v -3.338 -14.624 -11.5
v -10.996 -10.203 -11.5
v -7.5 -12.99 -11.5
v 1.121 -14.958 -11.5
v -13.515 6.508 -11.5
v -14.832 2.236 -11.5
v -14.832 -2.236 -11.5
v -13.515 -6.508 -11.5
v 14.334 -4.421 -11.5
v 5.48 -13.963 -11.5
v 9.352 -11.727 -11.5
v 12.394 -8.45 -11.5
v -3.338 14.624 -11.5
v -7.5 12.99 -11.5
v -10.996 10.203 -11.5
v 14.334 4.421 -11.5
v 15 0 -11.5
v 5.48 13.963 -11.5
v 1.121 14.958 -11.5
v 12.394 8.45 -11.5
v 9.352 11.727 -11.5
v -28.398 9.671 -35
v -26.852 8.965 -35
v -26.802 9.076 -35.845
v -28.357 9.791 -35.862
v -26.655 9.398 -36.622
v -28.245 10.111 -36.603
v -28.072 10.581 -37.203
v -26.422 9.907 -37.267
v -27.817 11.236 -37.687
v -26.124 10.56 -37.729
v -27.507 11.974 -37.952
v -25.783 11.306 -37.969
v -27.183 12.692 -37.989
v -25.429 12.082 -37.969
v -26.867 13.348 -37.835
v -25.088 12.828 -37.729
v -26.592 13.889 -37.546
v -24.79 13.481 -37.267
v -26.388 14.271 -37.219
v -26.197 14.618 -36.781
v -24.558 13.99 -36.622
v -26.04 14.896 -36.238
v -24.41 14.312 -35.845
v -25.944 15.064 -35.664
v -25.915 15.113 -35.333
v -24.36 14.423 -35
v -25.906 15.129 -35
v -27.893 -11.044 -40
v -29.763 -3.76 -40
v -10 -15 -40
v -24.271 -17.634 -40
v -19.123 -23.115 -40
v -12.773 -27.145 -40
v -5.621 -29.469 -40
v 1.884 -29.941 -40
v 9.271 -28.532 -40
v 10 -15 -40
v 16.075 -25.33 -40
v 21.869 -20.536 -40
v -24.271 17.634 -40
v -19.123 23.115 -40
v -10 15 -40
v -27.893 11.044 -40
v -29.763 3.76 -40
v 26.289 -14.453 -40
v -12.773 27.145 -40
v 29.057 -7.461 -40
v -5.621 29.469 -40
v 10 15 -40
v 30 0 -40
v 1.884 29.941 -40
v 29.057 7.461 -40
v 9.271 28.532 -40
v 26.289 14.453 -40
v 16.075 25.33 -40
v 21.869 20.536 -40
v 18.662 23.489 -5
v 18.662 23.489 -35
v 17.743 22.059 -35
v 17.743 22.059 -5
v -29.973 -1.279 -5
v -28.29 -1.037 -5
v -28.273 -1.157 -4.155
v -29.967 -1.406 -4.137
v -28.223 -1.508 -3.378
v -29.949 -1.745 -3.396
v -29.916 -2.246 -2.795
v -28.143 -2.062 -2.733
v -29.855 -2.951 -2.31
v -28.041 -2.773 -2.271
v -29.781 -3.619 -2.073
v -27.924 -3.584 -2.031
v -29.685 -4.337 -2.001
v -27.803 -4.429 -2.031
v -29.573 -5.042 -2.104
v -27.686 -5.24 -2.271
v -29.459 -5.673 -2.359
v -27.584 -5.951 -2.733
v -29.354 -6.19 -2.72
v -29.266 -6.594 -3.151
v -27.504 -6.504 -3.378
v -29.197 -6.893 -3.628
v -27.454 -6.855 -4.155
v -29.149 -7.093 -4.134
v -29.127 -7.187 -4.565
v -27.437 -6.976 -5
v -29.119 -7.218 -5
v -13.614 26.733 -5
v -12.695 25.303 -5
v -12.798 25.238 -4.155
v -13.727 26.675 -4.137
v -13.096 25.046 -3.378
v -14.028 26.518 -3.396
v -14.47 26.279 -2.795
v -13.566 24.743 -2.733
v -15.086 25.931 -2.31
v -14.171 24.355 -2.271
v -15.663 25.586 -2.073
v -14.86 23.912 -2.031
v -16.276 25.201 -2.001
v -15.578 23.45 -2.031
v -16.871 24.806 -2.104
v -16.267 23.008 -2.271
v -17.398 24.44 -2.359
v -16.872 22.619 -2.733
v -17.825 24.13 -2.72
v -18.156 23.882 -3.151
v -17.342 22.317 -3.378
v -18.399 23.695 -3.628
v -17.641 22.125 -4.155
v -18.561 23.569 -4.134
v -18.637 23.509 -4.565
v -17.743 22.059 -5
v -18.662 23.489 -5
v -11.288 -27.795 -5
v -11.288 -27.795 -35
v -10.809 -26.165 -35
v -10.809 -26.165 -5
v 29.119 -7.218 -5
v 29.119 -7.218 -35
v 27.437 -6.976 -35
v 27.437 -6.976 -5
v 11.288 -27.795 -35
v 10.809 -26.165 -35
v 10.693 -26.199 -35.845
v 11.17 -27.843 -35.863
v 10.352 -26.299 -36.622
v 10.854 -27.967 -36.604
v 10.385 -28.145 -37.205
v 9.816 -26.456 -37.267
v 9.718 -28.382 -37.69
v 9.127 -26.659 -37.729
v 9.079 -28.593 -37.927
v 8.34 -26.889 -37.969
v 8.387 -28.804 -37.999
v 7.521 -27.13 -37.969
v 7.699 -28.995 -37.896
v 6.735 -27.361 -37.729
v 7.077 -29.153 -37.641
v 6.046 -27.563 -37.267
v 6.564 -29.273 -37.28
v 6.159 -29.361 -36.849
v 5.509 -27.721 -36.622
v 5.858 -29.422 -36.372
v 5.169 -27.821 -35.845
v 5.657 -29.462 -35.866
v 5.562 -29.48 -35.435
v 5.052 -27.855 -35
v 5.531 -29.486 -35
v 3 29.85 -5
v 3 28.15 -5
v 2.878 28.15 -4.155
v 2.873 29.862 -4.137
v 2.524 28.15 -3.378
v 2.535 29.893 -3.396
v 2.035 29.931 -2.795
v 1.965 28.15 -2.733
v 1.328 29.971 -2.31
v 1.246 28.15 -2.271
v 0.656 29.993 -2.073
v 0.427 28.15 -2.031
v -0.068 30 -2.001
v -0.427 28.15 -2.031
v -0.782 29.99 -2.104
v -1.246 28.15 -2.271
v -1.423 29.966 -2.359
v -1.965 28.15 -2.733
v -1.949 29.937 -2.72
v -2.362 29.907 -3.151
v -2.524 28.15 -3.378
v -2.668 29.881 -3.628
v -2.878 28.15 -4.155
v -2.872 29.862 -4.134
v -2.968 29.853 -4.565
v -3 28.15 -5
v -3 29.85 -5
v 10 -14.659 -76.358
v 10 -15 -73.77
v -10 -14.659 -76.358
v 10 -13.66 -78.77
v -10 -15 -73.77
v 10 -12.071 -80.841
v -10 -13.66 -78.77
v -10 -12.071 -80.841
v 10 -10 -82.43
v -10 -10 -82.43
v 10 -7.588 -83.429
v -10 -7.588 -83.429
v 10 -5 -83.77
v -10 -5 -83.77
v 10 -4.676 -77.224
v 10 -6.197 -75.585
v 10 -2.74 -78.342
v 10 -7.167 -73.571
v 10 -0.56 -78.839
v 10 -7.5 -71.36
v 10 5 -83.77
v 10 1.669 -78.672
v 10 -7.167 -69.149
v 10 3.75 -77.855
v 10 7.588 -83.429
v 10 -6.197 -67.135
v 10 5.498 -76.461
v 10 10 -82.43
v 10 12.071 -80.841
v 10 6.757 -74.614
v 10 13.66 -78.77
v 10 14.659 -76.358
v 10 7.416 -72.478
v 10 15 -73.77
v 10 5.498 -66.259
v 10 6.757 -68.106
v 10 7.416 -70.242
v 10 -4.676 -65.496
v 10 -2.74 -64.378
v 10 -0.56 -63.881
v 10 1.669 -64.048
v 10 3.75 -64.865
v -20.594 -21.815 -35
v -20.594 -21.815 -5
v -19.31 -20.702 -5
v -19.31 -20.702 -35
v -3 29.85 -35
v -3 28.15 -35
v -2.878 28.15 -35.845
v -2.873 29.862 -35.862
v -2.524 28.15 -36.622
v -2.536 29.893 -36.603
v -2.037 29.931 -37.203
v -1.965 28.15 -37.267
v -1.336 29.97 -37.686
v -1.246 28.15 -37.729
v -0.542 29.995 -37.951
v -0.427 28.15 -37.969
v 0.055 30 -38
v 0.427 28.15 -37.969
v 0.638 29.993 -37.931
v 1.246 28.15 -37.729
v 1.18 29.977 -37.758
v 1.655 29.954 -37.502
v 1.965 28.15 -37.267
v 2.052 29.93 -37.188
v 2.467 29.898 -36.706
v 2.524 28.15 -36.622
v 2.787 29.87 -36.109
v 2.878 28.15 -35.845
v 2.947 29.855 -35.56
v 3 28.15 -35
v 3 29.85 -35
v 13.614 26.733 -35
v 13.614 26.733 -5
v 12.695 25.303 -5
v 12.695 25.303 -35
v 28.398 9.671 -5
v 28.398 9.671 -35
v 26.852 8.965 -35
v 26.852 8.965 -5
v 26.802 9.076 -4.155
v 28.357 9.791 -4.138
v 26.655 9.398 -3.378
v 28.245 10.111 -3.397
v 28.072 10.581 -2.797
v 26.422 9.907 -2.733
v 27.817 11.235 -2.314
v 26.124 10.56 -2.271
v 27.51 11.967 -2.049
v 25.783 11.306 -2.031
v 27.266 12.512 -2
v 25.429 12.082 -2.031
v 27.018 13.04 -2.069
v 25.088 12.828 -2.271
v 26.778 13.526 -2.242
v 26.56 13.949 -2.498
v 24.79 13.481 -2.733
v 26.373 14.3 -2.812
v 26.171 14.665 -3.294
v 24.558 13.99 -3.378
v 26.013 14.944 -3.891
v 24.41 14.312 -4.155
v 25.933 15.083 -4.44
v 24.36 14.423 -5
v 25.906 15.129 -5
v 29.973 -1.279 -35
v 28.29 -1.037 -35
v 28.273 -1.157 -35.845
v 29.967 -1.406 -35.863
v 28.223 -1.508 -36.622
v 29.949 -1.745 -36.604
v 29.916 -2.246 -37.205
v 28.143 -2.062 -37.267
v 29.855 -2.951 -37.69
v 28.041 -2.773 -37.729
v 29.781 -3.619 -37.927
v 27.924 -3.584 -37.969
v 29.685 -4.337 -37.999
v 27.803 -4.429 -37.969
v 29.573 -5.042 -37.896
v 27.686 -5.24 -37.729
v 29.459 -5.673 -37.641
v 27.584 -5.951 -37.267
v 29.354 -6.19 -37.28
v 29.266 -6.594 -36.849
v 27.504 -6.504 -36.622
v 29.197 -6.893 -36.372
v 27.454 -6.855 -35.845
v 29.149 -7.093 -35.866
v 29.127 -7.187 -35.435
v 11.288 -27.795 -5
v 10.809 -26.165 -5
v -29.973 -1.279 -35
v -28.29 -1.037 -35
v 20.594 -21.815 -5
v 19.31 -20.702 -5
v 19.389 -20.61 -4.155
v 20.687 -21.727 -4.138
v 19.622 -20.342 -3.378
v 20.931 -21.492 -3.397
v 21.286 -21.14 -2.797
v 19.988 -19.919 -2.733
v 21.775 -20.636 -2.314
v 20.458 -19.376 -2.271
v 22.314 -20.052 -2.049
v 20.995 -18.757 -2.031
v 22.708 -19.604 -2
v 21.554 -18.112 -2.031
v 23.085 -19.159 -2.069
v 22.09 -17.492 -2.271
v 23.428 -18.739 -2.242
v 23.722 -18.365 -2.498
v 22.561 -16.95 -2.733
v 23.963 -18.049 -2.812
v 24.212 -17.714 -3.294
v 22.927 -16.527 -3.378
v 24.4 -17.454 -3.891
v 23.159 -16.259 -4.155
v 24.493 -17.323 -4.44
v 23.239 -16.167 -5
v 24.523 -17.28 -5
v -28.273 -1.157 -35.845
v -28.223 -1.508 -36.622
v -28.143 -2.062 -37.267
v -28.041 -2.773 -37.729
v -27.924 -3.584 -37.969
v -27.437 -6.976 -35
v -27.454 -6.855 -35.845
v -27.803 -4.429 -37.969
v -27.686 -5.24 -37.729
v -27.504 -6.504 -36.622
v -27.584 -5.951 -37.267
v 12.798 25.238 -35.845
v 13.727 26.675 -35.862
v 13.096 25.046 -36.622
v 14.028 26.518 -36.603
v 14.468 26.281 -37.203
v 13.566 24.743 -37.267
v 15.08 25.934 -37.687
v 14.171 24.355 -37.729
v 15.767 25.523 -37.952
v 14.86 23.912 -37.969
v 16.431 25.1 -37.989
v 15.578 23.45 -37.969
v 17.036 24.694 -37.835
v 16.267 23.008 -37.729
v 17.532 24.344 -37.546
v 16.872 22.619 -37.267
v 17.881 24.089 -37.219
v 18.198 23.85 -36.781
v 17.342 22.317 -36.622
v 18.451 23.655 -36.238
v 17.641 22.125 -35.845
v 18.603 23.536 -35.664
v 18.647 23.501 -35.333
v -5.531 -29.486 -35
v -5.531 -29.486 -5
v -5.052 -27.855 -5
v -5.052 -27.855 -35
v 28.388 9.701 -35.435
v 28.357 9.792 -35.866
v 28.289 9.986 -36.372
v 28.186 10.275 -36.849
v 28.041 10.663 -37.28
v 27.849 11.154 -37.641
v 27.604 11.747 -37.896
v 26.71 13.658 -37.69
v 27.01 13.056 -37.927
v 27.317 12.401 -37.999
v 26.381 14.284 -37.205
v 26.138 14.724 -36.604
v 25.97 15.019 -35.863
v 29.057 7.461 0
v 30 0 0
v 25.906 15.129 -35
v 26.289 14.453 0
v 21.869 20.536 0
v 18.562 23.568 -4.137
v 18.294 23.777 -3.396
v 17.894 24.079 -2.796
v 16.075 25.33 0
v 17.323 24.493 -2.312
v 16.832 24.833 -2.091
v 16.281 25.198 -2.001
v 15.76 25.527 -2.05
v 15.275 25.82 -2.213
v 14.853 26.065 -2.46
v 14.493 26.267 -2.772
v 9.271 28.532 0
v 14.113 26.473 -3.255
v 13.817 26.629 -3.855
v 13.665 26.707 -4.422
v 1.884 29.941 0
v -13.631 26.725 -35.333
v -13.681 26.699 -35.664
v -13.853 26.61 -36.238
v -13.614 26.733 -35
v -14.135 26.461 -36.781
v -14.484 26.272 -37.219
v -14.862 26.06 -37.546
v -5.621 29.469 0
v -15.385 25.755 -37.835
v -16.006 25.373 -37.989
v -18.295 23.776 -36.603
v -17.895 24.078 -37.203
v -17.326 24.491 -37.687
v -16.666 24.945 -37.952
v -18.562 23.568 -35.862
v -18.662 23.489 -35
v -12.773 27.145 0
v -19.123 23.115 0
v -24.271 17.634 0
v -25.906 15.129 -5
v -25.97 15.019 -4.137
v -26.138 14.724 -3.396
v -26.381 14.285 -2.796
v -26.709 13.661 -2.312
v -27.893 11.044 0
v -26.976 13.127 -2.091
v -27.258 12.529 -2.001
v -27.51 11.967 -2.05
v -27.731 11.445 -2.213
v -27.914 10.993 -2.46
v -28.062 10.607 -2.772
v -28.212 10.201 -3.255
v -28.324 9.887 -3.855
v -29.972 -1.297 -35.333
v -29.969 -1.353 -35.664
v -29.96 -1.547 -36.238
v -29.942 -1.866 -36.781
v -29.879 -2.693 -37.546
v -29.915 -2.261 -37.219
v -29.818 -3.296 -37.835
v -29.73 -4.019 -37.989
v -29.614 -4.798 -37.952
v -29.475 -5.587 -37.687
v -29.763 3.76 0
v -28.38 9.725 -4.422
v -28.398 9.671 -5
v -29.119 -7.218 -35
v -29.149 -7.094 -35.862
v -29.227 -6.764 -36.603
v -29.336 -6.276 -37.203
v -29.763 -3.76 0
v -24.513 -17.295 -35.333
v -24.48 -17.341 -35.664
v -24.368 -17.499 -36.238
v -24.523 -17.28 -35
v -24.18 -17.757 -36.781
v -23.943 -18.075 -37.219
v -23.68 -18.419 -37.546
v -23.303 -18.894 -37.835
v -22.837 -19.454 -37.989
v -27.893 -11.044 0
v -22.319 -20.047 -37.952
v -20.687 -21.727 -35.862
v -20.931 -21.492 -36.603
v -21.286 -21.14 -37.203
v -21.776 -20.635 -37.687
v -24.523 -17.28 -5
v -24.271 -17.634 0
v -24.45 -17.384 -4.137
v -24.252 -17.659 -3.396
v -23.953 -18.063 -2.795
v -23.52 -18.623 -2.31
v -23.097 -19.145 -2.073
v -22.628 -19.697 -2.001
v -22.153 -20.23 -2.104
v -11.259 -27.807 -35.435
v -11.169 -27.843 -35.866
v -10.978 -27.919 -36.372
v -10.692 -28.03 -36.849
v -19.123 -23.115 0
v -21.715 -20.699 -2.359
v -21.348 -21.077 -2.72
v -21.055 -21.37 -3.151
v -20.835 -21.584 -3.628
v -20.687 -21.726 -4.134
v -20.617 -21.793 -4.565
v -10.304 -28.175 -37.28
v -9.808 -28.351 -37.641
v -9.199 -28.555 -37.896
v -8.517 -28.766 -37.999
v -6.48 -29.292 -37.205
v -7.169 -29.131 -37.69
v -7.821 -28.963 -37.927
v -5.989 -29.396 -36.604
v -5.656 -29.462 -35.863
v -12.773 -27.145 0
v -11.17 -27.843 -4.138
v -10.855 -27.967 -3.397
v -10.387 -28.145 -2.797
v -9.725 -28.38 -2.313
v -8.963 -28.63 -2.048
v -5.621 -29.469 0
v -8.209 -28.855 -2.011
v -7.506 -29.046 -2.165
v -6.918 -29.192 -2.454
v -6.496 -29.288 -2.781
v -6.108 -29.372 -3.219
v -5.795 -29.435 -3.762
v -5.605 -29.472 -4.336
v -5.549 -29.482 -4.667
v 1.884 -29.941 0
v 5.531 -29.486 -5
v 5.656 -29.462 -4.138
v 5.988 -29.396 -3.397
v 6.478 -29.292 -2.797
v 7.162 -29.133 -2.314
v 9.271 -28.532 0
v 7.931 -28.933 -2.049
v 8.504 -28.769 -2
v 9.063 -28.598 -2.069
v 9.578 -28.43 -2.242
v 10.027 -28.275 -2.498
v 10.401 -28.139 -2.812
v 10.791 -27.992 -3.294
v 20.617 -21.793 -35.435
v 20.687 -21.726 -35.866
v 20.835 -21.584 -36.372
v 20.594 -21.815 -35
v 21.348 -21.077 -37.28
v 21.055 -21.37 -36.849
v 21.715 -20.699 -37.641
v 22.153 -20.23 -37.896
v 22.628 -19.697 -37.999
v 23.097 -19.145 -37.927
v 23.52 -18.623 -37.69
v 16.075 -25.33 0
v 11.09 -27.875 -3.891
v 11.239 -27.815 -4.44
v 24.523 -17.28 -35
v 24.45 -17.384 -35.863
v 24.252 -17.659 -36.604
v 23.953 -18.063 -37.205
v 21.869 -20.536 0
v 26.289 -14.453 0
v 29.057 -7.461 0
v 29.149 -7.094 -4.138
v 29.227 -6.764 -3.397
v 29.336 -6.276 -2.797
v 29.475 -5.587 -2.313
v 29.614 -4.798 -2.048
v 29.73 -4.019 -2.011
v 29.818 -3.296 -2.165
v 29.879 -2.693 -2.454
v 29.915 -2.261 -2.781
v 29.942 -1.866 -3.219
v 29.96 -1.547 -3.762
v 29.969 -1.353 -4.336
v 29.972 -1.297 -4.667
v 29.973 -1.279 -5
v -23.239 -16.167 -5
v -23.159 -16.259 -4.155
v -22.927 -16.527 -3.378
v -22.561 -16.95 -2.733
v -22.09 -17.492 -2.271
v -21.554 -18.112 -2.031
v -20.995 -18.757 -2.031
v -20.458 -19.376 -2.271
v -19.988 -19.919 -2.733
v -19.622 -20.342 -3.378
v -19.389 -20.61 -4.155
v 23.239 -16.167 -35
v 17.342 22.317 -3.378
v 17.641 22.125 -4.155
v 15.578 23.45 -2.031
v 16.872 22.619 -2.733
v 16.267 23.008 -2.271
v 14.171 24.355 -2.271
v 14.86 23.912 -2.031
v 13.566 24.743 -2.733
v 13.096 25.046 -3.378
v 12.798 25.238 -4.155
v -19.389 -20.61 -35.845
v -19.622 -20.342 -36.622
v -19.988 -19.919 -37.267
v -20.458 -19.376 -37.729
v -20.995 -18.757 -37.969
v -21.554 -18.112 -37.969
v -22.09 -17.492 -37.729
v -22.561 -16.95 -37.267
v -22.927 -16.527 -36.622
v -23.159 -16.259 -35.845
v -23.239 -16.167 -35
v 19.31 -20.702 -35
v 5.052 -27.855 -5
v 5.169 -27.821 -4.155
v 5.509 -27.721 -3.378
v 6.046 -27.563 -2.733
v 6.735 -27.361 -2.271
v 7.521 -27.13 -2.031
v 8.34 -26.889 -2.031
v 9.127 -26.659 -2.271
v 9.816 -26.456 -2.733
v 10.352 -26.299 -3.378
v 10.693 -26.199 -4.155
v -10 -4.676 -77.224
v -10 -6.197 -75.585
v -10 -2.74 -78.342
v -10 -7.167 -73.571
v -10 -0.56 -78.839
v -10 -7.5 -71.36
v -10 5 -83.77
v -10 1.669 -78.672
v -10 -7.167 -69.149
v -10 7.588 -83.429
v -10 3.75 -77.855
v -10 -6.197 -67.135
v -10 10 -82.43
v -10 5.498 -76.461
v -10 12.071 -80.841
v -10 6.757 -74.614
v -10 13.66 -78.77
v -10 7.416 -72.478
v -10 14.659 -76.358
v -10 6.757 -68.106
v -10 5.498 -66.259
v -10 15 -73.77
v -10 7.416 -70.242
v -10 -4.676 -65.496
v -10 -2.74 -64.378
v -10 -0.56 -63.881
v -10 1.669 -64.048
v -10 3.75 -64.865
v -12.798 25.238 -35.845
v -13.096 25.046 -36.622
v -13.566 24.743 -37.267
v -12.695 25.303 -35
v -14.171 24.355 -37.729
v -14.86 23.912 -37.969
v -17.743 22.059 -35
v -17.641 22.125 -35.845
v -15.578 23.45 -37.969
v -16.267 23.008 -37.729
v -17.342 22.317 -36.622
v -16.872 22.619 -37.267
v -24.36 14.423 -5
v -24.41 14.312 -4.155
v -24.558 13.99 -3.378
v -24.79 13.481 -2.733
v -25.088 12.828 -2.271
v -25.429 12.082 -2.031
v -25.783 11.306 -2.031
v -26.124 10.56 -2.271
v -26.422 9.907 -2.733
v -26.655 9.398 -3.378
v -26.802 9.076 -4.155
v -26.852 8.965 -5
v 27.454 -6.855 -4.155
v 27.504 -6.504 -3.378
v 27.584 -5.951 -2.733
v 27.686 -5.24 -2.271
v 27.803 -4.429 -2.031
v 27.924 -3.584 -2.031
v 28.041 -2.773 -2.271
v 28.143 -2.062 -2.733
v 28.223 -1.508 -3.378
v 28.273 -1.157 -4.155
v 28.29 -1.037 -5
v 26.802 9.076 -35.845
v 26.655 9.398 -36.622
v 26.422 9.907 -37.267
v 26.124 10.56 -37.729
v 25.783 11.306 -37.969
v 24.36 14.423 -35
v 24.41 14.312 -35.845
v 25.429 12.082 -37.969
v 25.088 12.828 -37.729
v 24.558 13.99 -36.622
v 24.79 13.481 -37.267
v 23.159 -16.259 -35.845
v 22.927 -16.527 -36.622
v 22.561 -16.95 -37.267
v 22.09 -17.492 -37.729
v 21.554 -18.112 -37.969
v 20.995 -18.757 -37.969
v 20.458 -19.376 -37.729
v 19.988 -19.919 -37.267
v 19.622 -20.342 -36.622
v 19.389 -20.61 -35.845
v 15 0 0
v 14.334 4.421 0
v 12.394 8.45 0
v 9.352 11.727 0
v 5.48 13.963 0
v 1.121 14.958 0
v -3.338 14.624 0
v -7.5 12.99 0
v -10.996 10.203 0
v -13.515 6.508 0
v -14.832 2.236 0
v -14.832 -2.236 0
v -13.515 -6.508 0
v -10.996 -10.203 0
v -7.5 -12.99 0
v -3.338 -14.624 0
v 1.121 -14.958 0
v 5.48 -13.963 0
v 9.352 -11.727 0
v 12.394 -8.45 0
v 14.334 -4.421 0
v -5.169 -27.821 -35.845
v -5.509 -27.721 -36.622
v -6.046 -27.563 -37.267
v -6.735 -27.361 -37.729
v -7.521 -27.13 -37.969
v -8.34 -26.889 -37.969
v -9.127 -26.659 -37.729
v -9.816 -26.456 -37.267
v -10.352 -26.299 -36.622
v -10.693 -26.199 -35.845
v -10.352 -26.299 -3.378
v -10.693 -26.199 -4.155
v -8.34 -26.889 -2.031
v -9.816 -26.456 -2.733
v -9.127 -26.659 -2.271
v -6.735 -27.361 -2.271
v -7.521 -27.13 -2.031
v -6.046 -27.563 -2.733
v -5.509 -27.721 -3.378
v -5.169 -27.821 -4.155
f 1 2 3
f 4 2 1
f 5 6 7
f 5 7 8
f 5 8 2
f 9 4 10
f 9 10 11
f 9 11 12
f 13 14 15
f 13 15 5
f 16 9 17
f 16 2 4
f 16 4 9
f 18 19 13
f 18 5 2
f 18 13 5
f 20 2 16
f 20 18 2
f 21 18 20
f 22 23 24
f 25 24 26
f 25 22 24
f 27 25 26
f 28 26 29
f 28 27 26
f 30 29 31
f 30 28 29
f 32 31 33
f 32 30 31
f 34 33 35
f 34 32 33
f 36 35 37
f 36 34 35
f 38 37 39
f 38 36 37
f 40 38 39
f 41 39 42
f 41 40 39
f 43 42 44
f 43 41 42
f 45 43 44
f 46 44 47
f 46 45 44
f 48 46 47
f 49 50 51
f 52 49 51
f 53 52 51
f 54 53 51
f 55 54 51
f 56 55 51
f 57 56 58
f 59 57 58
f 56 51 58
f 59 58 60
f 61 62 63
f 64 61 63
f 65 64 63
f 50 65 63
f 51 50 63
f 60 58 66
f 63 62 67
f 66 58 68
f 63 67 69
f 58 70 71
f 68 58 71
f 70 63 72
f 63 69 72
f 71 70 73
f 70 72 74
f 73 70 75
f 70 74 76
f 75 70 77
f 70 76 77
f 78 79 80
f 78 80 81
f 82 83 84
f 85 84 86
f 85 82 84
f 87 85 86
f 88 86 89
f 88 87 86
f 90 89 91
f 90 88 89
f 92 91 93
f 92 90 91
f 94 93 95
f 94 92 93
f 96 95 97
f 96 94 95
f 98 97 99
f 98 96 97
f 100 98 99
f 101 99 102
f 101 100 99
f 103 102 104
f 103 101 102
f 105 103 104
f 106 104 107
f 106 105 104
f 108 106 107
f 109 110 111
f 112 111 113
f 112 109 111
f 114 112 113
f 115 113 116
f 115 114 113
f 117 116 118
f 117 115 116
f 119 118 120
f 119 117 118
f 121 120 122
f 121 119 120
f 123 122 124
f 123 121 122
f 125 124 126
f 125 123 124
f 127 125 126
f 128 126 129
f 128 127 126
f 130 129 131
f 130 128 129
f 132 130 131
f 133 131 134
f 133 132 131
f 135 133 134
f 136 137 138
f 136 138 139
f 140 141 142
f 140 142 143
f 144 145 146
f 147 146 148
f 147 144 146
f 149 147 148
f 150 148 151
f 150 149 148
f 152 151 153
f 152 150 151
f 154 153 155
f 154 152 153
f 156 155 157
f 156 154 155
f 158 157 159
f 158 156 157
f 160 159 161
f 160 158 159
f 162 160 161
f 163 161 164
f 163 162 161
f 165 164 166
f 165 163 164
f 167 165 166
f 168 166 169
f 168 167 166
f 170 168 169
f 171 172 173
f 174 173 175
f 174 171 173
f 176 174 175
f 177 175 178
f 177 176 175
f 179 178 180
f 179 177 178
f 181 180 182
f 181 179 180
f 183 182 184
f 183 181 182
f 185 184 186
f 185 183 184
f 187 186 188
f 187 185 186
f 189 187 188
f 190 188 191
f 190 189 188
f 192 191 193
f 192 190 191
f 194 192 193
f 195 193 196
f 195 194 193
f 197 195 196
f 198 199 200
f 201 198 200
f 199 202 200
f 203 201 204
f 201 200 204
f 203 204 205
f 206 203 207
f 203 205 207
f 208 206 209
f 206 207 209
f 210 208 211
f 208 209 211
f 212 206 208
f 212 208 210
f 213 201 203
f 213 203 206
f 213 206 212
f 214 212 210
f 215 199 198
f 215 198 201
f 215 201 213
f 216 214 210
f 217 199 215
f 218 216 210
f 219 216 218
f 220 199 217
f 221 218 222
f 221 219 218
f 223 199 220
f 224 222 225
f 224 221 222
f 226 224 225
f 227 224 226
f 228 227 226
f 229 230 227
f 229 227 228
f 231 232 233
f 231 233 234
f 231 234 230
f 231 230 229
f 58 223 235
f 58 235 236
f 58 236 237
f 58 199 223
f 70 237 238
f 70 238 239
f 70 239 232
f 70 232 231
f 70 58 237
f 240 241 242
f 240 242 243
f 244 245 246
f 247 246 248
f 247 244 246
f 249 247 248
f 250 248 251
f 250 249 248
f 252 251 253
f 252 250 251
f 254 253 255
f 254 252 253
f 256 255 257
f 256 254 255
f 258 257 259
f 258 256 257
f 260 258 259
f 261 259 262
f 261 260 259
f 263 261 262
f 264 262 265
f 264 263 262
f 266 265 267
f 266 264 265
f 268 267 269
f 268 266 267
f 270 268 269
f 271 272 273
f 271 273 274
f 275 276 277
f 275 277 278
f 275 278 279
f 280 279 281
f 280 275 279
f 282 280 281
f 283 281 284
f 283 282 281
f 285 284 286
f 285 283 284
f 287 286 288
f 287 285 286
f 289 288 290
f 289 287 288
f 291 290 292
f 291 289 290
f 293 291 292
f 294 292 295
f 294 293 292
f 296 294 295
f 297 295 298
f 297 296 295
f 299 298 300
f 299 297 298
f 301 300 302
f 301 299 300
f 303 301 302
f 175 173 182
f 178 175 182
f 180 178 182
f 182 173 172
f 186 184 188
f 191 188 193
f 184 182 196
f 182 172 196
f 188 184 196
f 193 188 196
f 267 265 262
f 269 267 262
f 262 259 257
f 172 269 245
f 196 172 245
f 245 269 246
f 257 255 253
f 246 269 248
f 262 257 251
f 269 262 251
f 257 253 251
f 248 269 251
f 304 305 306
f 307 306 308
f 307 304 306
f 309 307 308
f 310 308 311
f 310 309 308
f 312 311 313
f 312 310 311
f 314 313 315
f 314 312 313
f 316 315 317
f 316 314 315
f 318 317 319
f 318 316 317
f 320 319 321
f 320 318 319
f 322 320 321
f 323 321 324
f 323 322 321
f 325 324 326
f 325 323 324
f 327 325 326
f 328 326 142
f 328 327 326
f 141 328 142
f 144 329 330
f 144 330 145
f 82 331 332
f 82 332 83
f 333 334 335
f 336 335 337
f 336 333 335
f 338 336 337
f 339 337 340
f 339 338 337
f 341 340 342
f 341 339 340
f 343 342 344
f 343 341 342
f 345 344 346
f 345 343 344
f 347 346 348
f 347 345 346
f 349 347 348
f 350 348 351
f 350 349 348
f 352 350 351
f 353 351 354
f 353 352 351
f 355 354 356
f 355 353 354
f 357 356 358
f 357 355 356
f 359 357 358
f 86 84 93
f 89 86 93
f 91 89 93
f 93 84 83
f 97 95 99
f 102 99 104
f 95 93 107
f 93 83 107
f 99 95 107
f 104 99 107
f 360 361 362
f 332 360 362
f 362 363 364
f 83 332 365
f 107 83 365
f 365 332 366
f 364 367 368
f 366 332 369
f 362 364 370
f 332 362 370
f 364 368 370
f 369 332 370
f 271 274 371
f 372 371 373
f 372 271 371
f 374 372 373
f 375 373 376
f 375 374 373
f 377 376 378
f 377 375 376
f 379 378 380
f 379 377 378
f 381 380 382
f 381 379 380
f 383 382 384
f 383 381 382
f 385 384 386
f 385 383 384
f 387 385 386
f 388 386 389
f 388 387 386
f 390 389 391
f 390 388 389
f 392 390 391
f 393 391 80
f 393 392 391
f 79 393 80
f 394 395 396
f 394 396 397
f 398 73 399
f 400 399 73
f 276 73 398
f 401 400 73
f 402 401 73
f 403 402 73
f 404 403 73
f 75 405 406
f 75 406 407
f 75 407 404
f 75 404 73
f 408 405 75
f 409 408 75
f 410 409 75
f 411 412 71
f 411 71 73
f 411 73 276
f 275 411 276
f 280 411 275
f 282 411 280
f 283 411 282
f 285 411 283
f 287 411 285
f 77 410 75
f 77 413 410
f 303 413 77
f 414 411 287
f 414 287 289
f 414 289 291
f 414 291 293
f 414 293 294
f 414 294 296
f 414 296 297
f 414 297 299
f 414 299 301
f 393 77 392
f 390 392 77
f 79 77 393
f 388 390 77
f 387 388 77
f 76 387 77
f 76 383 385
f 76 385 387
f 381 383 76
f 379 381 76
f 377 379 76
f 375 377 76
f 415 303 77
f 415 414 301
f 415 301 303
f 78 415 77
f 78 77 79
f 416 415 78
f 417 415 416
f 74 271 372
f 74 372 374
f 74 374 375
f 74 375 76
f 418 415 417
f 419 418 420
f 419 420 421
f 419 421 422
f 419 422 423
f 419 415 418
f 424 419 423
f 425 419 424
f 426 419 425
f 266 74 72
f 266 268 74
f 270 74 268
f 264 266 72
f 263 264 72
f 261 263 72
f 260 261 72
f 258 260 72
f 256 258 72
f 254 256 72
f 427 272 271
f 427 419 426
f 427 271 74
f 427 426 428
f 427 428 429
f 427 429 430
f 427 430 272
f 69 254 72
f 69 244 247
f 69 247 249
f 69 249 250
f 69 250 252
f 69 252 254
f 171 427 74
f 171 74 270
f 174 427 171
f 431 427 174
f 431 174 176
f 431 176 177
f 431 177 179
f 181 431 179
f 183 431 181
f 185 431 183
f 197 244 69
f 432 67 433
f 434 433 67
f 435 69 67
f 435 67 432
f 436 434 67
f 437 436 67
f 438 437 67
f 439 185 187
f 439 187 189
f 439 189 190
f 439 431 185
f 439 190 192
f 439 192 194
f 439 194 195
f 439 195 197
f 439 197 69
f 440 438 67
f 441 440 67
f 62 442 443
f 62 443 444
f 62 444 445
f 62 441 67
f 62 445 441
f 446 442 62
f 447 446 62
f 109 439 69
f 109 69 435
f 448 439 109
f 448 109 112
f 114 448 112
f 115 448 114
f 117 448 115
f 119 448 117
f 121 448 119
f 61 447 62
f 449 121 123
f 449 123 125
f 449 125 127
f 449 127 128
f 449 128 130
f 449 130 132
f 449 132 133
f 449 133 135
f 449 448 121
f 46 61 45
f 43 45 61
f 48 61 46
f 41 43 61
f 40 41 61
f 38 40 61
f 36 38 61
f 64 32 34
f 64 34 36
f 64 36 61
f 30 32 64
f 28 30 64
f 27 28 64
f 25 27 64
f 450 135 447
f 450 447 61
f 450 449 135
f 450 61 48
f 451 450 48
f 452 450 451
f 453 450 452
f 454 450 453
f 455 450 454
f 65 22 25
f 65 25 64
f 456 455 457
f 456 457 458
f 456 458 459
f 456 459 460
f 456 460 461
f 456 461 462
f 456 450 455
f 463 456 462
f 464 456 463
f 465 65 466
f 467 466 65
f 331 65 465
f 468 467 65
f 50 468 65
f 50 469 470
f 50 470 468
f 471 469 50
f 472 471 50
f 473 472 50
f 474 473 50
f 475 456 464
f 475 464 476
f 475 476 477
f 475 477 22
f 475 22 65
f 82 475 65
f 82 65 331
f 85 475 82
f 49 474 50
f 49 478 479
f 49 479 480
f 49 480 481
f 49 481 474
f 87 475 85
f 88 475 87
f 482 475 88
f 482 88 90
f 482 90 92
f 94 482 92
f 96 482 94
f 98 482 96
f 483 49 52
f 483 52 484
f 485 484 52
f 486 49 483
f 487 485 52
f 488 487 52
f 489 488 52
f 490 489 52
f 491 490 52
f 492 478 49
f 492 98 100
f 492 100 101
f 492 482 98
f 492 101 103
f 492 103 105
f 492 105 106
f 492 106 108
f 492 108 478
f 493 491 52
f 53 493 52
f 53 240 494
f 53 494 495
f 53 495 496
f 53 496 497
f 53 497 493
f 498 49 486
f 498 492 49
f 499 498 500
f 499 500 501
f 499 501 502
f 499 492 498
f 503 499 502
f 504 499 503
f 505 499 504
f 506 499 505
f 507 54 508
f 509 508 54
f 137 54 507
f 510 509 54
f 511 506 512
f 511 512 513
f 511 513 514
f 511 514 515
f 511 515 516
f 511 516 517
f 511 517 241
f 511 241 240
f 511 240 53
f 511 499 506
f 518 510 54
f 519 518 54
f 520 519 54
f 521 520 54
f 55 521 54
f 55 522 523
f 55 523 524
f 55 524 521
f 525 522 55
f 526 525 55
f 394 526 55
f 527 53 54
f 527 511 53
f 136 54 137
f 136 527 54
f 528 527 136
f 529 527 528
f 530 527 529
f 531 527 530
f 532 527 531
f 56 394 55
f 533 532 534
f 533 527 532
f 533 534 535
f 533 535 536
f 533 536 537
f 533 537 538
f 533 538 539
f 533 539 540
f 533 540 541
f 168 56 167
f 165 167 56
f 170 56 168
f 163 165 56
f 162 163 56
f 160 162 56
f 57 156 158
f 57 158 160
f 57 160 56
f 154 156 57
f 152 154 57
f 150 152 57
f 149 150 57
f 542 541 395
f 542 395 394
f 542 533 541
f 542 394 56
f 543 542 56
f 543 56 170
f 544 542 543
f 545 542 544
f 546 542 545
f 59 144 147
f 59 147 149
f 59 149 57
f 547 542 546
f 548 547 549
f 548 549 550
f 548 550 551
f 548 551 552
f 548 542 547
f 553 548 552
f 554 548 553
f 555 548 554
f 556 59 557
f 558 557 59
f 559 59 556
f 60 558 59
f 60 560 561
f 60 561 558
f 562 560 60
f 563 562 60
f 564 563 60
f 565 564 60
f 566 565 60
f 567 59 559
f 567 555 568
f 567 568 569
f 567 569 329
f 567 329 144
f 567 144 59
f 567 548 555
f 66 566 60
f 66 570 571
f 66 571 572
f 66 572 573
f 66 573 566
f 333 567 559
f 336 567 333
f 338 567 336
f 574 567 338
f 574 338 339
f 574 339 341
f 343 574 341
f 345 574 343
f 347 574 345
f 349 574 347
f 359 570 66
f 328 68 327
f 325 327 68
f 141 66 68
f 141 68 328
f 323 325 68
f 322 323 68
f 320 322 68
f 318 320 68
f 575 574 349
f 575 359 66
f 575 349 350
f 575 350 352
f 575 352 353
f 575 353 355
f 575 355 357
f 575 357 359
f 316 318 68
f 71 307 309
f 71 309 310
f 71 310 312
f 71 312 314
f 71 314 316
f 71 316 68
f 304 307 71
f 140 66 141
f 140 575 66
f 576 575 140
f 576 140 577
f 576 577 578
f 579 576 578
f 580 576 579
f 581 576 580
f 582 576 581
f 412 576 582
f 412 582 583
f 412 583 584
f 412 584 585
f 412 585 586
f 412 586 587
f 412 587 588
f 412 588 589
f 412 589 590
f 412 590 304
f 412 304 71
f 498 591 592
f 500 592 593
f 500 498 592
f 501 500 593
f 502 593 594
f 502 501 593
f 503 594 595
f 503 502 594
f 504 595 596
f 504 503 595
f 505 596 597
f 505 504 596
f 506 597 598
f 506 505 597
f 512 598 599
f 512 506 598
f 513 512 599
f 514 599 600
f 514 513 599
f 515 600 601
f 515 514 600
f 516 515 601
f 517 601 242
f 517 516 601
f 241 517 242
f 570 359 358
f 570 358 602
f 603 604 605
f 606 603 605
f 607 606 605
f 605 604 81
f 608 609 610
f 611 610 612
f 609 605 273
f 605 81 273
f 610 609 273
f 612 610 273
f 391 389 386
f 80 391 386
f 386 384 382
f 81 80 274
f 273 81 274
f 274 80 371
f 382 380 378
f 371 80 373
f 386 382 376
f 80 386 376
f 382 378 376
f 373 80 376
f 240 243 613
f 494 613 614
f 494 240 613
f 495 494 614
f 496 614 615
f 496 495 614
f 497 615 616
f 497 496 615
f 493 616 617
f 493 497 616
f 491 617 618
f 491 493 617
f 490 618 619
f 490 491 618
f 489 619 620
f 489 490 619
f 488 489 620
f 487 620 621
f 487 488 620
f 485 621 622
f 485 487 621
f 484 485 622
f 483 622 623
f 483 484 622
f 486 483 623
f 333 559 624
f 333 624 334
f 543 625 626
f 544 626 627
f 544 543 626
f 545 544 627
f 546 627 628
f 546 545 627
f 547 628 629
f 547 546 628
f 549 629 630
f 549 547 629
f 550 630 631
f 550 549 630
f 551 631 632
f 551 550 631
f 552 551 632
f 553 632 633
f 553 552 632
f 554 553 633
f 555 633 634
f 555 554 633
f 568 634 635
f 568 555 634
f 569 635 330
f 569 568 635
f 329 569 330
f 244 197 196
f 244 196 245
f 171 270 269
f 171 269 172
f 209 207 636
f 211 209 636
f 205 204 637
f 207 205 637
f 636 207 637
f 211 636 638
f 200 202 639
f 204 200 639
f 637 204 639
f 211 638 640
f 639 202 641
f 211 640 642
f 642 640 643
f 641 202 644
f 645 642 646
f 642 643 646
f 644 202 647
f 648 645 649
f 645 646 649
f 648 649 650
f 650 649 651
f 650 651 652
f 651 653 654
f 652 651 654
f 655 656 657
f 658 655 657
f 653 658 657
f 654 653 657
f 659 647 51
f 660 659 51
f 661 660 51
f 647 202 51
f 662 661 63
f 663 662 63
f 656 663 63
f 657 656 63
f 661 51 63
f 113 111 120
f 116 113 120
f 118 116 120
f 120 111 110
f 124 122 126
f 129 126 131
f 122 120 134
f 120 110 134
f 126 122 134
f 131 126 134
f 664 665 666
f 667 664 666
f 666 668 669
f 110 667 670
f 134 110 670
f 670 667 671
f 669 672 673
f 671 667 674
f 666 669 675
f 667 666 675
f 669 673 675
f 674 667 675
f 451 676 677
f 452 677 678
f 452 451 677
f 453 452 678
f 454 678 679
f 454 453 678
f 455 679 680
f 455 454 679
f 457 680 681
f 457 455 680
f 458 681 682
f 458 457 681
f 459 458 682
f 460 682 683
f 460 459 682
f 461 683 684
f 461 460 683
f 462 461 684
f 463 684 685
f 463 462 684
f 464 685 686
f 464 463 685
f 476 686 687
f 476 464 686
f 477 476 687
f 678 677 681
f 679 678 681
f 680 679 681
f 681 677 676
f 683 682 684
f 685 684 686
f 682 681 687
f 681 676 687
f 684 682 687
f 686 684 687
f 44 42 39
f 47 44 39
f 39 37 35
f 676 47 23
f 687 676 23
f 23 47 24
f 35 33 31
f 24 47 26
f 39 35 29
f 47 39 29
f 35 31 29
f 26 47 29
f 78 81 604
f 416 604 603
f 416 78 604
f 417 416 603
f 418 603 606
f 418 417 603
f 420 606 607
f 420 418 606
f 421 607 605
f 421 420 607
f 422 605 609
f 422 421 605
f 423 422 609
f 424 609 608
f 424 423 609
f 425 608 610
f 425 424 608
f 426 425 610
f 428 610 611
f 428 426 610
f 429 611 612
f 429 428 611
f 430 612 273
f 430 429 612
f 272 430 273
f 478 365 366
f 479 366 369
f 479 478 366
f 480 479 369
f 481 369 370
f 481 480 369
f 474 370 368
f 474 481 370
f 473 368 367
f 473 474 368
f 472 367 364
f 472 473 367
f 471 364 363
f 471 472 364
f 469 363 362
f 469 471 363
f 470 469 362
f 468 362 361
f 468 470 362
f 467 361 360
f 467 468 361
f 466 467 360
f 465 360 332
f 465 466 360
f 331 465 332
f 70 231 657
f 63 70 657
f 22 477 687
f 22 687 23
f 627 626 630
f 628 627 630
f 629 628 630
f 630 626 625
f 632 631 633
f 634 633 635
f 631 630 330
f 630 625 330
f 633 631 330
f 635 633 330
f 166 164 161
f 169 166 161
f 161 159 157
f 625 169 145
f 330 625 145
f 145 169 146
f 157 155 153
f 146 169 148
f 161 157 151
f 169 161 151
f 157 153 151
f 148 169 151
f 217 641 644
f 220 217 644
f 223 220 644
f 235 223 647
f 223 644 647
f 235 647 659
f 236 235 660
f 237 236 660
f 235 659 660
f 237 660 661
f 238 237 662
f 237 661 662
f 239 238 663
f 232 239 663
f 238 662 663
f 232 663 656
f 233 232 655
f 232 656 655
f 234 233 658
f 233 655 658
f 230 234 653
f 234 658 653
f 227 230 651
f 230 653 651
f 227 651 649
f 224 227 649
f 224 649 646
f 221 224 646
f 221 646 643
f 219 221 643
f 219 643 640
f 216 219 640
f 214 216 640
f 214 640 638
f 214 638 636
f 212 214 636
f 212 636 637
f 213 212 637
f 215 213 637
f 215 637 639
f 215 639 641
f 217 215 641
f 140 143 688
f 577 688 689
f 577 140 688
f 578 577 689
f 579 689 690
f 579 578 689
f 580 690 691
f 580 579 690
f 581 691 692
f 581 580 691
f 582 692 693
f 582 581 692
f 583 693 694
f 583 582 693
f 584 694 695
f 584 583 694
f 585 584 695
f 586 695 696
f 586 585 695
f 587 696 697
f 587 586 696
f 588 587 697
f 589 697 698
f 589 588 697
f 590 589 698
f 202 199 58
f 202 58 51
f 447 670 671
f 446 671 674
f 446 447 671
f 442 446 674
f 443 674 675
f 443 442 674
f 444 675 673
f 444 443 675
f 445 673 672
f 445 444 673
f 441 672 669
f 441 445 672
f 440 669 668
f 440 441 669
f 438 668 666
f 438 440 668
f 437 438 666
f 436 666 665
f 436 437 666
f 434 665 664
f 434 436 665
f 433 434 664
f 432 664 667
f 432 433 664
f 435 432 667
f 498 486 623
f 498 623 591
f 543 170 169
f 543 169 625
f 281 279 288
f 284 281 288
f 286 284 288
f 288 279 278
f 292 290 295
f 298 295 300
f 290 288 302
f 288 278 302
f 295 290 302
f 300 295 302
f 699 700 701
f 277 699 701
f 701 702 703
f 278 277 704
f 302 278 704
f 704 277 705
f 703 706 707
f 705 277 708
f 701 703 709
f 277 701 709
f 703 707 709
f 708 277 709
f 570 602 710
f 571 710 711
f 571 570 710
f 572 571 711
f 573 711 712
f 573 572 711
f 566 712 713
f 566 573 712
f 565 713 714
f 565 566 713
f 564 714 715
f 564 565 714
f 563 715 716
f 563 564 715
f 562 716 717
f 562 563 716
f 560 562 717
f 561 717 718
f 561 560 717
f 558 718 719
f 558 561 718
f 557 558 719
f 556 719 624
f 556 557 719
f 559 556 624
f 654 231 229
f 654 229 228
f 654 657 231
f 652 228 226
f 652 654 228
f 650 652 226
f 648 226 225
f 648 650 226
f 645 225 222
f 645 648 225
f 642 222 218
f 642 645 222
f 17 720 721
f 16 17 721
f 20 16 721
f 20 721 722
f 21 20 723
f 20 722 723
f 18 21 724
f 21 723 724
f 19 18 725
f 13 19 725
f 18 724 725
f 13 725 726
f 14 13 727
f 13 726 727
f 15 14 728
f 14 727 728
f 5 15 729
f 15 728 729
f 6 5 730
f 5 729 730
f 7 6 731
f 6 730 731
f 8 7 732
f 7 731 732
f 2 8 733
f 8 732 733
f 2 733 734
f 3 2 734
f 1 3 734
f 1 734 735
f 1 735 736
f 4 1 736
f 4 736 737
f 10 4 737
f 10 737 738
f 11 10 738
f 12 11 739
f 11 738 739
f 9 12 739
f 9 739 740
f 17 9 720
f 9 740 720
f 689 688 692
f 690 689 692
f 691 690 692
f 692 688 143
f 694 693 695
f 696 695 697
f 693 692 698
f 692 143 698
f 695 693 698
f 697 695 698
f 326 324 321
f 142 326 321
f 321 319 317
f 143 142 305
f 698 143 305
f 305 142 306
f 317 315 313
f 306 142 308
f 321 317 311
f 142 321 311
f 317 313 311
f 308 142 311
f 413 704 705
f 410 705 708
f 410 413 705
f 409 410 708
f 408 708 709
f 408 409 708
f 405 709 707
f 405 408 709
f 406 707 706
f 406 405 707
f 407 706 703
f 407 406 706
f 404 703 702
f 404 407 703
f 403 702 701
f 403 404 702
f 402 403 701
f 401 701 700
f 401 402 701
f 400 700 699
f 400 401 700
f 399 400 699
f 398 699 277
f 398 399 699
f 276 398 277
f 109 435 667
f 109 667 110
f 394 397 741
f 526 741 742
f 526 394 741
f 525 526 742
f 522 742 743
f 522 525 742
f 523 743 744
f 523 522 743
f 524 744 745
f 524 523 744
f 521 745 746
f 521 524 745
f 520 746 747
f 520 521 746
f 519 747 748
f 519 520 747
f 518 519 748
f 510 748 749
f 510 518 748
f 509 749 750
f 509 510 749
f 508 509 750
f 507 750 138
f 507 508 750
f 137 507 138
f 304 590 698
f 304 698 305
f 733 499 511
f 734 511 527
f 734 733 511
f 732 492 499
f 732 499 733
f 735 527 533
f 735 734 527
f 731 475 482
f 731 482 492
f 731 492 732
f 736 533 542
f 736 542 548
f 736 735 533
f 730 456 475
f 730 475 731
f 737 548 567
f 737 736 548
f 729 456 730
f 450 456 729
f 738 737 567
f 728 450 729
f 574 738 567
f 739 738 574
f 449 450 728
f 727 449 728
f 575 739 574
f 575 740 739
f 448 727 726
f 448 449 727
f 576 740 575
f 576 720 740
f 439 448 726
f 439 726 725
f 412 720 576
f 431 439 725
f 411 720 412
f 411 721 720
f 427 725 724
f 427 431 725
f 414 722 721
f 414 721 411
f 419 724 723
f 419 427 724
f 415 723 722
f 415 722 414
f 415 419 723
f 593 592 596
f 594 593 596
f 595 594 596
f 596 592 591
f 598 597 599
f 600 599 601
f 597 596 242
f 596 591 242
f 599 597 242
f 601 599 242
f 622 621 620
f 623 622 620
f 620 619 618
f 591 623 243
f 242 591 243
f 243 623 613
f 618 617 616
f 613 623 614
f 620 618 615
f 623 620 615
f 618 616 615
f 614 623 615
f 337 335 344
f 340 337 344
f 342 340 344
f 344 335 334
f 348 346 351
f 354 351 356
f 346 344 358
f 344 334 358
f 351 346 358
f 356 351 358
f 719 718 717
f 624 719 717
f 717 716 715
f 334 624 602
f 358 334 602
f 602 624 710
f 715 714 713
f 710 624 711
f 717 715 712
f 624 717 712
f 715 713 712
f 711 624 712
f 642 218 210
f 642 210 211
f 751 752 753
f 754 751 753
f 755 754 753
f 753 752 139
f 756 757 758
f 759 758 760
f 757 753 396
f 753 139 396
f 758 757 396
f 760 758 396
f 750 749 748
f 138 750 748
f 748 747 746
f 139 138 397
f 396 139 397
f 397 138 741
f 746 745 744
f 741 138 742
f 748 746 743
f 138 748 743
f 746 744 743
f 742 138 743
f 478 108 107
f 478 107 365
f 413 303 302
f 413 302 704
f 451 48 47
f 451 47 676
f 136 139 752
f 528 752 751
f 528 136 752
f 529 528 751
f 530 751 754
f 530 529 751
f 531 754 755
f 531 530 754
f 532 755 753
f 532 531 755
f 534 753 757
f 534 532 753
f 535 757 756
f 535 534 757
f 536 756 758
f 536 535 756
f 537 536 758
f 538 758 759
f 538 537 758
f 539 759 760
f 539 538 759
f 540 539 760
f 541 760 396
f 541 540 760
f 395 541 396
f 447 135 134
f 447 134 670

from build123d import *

# Parameters (mm, degrees)
SKETCH1_R           = 30
BOSS_EXTRUDE1_DEPTH = 40
SKETCH2_R           = 15
CUT_EXTRUDE1_DEPTH  = 11.5
SKETCH3_W           = 20
SKETCH3_H           = 30
BOSS_EXTRUDE2_DEPTH = 43.77
FILLET1_R           = 10
SKETCH4_R           = 7.5
CUT_EXTRUDE2_DEPTH  = 43.77
CUT_EXTRUDE3_DEPTH  = 1.85
CIRPATTERN1_COUNT   = 11


with BuildPart() as part:
    # Sketch1 → Boss-Extrude1 (new body)
    with BuildSketch(Plane.XY):
        Circle(SKETCH1_R)
    extrude(amount=-BOSS_EXTRUDE1_DEPTH)

    # Sketch2 → Cut-Extrude1 (cut)
    with BuildSketch(Plane.XY):
        Circle(SKETCH2_R)
    extrude(amount=-CUT_EXTRUDE1_DEPTH, mode=Mode.SUBTRACT)

    # Sketch3 → Boss-Extrude2 (add)
    with BuildSketch(Plane(origin=(0, 0, -40), x_dir=(-1, 0, 0), z_dir=(0, 0, -1))):
        Rectangle(SKETCH3_W, SKETCH3_H)
    extrude(amount=BOSS_EXTRUDE2_DEPTH)

    # Fillet1
    fillet1_edges = [part.edges().sort_by_distance(p)[0] for p in [
        (0, -15, -83.77),
        (0, 15, -83.77),
    ]]
    fillet(fillet1_edges, radius=FILLET1_R)

    # Sketch4 → Cut-Extrude2 (cut)
    with BuildSketch(Plane.ZY.offset(10)):
        with Locations(Location((-71.36, 0, 0), (0, 0, 270))):
            Circle(SKETCH4_R)
    extrude(amount=-CUT_EXTRUDE2_DEPTH, mode=Mode.SUBTRACT)

    # Sketch5 → Cut-Extrude3 (cut)
    with BuildSketch(Plane(origin=(0, 30, 0), x_dir=(1, 0, 0), z_dir=(0, 1, 0))):
        with BuildLine():
            Line((3, 35), (3, 5))
            ThreePointArc((3, 5), (0, 2), (-3, 5))
            Line((-3, 5), (-3, 35))
            ThreePointArc((-3, 35), (0, 38), (3, 35))
        make_face()
    cut_extrude3 = extrude(amount=-CUT_EXTRUDE3_DEPTH, mode=Mode.SUBTRACT)

    # CirPattern1: Cut-Extrude3 ×11 about axis
    cirpattern1_axis = Axis((0, 0, 0), (0, 0, 1))
    for i in range(1, CIRPATTERN1_COUNT):
        add(cut_extrude3.rotate(cirpattern1_axis, i * 360 / CIRPATTERN1_COUNT), mode=Mode.SUBTRACT)


solid = part.part
